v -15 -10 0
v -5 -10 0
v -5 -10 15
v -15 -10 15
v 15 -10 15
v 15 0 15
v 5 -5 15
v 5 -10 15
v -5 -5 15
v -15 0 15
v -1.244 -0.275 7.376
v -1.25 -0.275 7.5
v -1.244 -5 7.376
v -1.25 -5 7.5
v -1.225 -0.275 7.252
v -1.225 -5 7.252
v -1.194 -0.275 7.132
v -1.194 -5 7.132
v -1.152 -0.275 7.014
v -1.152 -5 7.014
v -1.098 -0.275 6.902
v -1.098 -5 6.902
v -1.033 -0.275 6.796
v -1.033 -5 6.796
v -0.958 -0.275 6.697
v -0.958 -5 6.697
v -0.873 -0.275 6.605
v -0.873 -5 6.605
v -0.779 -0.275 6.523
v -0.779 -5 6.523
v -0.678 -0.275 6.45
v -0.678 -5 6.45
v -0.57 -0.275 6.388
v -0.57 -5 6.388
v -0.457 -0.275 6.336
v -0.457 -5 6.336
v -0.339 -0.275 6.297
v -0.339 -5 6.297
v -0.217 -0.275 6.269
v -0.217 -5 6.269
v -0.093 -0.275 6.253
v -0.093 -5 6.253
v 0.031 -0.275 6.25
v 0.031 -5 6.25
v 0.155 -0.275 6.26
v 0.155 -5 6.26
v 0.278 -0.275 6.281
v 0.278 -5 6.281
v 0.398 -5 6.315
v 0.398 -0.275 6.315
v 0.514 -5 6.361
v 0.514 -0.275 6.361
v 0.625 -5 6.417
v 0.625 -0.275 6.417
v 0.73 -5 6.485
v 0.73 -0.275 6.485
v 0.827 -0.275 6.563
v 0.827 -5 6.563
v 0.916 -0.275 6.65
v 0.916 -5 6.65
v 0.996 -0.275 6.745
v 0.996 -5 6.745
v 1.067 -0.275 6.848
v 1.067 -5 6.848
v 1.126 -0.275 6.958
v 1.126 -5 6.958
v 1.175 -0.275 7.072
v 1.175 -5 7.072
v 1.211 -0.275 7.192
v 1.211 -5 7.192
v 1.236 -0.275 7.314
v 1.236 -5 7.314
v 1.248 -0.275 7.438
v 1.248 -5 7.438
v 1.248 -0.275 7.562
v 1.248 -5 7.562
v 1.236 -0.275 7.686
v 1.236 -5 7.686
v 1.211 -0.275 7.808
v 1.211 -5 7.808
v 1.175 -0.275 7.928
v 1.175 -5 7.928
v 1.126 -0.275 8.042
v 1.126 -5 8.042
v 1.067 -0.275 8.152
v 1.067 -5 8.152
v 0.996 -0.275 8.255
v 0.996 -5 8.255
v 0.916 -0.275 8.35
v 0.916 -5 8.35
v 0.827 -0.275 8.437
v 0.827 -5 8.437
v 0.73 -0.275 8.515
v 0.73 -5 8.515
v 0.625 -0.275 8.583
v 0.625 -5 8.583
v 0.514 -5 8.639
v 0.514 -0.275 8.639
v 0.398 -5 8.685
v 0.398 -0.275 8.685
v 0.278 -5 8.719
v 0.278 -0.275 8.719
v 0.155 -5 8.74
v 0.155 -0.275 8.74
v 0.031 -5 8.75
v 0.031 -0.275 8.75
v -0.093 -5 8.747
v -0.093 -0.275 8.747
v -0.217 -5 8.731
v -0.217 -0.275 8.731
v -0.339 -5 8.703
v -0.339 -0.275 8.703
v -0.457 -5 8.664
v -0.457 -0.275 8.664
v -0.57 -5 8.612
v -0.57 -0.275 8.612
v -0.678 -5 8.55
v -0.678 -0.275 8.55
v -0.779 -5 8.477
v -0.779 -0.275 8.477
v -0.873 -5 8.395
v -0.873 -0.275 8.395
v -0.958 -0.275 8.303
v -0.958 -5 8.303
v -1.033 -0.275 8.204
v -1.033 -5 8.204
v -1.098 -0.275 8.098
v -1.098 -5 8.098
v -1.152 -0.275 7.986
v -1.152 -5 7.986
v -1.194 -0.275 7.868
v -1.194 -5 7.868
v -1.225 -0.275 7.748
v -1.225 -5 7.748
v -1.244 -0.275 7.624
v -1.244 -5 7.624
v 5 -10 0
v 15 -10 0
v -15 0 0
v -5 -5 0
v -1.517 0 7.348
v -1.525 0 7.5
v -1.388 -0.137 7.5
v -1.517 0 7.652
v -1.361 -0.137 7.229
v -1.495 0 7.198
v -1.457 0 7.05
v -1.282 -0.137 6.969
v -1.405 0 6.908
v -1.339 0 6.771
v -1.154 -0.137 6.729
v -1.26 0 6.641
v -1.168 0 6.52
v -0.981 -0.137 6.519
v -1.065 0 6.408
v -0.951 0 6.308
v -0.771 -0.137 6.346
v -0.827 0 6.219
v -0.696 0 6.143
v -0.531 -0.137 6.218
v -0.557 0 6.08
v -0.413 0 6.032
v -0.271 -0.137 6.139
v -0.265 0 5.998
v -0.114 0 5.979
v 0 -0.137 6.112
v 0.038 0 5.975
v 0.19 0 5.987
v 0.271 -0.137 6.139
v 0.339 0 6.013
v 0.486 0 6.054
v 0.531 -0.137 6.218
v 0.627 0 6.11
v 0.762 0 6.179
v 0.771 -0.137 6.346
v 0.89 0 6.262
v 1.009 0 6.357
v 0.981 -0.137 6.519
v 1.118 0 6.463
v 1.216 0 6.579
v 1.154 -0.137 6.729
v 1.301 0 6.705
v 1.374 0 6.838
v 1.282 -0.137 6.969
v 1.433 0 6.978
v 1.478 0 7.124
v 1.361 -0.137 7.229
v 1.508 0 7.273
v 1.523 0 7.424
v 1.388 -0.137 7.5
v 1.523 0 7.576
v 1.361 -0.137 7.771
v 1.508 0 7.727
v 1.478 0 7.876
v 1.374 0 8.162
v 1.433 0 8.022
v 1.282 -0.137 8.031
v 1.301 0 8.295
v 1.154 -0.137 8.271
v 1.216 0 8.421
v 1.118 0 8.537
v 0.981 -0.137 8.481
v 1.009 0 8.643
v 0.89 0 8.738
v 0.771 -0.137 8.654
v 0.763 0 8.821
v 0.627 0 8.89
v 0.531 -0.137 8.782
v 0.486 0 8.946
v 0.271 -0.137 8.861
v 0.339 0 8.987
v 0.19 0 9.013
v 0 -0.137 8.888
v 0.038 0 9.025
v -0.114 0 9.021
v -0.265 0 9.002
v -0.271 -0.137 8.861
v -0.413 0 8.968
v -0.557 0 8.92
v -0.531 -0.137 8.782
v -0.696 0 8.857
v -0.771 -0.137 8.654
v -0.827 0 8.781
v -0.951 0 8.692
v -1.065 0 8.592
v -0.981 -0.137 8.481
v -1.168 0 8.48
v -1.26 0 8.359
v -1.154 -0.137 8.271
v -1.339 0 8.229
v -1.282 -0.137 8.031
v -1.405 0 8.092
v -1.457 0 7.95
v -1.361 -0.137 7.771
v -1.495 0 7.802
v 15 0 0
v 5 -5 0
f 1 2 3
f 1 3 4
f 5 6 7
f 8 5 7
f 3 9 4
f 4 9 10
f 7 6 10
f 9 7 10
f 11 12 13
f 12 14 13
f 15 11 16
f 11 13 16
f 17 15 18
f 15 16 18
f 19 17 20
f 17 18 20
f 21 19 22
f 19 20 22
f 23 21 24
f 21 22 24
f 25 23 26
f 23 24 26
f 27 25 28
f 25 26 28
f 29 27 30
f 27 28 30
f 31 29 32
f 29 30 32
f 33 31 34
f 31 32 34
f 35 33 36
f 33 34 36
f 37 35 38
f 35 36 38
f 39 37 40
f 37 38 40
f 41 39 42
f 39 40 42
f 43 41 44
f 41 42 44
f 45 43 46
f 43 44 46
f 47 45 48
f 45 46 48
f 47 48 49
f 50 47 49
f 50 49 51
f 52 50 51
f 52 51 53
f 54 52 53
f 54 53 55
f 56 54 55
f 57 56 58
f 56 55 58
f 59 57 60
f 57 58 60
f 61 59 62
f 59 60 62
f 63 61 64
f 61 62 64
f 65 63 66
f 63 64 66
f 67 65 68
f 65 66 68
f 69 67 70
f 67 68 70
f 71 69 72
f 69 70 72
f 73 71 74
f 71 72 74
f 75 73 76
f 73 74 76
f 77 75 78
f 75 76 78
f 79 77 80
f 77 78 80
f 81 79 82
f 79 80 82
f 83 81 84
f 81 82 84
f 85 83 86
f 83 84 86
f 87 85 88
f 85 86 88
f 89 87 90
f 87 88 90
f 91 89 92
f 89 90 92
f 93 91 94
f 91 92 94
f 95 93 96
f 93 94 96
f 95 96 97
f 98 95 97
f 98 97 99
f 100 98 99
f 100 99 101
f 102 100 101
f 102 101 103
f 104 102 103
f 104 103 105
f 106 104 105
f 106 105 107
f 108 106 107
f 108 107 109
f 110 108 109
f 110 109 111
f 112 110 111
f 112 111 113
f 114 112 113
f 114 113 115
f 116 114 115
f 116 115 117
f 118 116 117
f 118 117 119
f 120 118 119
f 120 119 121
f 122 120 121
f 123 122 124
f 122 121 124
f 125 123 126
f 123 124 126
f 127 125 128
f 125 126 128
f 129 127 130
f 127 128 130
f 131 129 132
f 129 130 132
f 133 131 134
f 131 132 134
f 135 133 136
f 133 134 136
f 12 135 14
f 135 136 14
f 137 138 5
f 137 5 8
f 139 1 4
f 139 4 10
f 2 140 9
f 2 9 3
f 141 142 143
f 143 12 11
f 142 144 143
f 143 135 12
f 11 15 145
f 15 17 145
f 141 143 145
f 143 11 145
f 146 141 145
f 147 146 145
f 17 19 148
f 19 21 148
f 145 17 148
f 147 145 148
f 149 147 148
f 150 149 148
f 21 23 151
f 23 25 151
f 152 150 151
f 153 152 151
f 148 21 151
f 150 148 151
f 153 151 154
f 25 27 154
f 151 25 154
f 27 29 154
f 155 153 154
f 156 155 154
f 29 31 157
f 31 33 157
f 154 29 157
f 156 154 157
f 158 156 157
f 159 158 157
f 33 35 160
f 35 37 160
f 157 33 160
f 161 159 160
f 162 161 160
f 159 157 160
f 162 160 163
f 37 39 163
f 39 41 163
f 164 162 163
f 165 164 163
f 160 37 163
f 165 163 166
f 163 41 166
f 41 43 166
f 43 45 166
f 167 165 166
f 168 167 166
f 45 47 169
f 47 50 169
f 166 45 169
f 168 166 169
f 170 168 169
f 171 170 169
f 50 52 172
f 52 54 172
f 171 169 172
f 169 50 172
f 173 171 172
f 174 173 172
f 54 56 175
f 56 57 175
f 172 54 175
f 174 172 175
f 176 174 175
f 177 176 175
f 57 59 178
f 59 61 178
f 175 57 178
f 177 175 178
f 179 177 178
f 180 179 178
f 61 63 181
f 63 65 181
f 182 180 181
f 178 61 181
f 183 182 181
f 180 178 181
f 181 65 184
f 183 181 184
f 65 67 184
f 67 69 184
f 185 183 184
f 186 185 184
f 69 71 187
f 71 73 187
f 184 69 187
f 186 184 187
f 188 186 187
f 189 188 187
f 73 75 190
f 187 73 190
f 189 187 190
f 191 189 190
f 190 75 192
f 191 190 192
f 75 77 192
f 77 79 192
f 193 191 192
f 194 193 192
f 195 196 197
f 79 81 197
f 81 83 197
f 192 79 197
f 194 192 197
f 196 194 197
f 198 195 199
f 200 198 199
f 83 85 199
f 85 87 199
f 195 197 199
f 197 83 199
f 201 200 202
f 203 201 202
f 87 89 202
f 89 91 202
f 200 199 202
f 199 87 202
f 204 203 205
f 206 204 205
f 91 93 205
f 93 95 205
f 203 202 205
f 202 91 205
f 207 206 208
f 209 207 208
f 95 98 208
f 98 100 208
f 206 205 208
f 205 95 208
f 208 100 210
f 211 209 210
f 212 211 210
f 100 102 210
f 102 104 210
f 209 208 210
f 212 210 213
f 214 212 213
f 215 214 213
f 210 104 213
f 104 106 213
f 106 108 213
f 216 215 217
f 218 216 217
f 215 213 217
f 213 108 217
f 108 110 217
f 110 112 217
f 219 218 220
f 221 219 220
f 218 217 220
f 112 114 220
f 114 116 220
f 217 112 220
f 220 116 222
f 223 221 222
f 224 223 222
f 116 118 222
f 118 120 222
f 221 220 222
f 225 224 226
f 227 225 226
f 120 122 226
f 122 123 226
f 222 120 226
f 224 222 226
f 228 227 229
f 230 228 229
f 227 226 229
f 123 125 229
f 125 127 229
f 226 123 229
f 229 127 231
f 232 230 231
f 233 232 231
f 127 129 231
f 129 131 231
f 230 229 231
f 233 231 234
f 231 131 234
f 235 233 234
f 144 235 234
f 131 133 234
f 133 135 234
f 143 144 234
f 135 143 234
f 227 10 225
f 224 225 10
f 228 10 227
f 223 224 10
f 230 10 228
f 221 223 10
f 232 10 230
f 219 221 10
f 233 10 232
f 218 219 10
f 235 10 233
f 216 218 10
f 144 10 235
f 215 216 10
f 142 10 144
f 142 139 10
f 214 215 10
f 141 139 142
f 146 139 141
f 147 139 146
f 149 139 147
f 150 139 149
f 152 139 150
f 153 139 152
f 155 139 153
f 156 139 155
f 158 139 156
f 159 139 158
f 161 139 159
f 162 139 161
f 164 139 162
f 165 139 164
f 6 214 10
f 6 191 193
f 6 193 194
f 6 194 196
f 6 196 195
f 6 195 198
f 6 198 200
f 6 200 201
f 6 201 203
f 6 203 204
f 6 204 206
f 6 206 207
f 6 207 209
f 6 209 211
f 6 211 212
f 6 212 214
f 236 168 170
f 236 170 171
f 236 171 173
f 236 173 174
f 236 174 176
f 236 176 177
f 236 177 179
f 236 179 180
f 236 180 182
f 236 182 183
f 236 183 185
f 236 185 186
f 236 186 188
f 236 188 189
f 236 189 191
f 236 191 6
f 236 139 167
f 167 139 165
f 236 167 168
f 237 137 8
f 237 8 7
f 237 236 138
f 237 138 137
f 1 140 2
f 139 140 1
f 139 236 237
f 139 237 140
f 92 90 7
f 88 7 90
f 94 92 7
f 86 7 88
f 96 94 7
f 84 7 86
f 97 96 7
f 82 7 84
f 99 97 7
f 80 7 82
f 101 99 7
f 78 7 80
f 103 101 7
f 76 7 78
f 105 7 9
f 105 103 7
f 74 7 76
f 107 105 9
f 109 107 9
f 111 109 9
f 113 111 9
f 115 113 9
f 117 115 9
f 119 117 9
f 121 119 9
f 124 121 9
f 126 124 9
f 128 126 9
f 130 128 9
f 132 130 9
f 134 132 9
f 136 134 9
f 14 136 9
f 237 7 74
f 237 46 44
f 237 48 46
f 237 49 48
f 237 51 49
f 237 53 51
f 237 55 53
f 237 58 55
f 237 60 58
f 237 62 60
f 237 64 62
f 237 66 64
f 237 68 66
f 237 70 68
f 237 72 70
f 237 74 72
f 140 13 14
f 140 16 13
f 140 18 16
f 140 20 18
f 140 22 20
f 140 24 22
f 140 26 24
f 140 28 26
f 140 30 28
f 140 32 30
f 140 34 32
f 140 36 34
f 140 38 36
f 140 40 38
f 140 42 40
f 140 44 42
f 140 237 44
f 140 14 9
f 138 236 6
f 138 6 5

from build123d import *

# Parameters (mm, degrees)
BOSS_EXTRUDE1_DEPTH             = 15
M3X0_5_TAPPED_HOLE1_D           = 2.5
M3X0_5_TAPPED_HOLE1_CSINK_D     = 3.05
M3X0_5_TAPPED_HOLE1_CSINK_ANGLE = 90


with BuildPart() as part:
    # Sketch1 → Boss-Extrude1 (new body)
    with BuildSketch(Plane.XY):
        Polygon((-15, 0), (15, 0), (15, -10), (5, -10), (5, -5), (-5, -5), (-5, -10), (-15, -10), align=None)
    extrude(amount=BOSS_EXTRUDE1_DEPTH)

    # M3x0.5 Tapped Hole1 (through all)
    with Locations(Plane(origin=(0, 0, 0), x_dir=(1, 0, 0), z_dir=(0, 1, 0))):
        with Locations((0, -7.5)):
            CounterSinkHole(M3X0_5_TAPPED_HOLE1_D / 2, M3X0_5_TAPPED_HOLE1_CSINK_D / 2, counter_sink_angle=M3X0_5_TAPPED_HOLE1_CSINK_ANGLE)


solid = part.part
